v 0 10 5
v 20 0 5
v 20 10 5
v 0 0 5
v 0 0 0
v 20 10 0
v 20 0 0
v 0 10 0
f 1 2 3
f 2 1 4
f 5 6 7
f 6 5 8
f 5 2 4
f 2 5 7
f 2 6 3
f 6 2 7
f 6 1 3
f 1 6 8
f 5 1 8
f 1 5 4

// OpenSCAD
// Hello World in OpenSCAD: Create a simple cube
cube([20, 10, 5]);  // width=20, depth=10, height=5
